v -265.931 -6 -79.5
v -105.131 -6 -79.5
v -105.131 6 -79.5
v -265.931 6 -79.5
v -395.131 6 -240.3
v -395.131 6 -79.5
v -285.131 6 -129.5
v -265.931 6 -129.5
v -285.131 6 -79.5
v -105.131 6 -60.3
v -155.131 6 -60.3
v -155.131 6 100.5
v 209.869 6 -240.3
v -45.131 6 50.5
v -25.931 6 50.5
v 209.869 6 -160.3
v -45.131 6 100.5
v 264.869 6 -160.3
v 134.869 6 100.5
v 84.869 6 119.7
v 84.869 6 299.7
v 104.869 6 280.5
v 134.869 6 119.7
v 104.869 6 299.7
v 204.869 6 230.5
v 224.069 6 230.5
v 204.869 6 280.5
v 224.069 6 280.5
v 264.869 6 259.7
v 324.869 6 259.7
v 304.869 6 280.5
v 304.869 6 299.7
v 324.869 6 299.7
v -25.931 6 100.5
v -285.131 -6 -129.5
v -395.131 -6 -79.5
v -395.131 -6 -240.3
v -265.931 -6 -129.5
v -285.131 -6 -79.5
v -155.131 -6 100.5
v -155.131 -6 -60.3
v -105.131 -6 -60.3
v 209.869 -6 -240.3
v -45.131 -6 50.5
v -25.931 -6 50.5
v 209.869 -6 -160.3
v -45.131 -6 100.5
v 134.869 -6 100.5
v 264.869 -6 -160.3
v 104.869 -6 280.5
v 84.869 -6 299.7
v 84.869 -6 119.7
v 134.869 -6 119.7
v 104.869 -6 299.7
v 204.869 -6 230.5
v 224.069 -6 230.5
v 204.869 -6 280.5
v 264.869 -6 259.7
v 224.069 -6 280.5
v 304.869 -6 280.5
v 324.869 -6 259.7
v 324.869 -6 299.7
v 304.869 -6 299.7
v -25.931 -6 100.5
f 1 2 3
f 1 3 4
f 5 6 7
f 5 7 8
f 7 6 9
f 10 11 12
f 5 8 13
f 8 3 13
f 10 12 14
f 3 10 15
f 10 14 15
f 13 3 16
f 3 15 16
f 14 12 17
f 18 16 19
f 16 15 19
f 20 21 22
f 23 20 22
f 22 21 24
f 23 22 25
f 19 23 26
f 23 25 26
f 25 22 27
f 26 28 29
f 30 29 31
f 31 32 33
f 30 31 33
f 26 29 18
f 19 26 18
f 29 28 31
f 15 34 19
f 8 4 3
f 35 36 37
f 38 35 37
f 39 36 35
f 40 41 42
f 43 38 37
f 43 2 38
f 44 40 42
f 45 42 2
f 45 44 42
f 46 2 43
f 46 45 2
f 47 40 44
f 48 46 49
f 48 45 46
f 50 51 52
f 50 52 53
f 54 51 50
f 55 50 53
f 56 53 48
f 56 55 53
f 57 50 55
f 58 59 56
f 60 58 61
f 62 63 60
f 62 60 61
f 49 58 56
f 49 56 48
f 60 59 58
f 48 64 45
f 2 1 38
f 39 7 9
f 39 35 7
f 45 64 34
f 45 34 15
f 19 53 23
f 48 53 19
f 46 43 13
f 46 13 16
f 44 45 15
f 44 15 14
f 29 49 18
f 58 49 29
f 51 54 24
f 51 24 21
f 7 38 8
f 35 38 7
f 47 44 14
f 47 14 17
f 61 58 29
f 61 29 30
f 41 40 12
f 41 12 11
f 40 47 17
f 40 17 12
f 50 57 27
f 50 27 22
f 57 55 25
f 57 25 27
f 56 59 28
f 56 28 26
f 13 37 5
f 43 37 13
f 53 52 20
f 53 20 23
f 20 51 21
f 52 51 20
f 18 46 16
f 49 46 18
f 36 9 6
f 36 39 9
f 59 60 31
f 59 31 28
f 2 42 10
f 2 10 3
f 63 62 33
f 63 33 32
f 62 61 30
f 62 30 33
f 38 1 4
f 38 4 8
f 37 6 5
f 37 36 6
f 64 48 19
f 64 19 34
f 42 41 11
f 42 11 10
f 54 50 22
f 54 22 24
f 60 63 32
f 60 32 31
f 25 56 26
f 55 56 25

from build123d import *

# Parameters (mm, degrees)
F1_DEPTH = 6


with BuildPart() as f1:
    # F0 (on Front) → F1 (new body, symmetric)
    with BuildSketch(Plane.XZ):
        Polygon((-395.130562, -79.500396), (-395.130562, -240.300396), (209.869438, -240.300396), (209.869438, -160.300396), (264.869438, -160.300396), (264.869438, 259.699604), (324.869438, 259.699604), (324.869438, 299.699604), (304.869438, 299.699604), (304.869438, 280.499604), (224.069438, 280.499604), (224.069438, 230.499604), (204.869438, 230.499604), (204.869438, 280.499604), (104.869438, 280.499604), (104.869438, 299.699604), (84.869438, 299.699604), (84.869438, 119.699604), (134.869438, 119.699604), (134.869438, 100.499604), (-25.930562, 100.499604), (-25.930562, 50.499604), (-45.130562, 50.499604), (-45.130562, 100.499604), (-155.130562, 100.499604), (-155.130562, -60.300396), (-105.130562, -60.300396), (-105.130562, -79.500396), (-172.839355, -79.500396), (-265.930562, -79.500396), (-265.930562, -129.500396), (-285.130562, -129.500396), (-285.130562, -79.500396), align=None)
    extrude(amount=F1_DEPTH, both=True)


solid = f1.part
